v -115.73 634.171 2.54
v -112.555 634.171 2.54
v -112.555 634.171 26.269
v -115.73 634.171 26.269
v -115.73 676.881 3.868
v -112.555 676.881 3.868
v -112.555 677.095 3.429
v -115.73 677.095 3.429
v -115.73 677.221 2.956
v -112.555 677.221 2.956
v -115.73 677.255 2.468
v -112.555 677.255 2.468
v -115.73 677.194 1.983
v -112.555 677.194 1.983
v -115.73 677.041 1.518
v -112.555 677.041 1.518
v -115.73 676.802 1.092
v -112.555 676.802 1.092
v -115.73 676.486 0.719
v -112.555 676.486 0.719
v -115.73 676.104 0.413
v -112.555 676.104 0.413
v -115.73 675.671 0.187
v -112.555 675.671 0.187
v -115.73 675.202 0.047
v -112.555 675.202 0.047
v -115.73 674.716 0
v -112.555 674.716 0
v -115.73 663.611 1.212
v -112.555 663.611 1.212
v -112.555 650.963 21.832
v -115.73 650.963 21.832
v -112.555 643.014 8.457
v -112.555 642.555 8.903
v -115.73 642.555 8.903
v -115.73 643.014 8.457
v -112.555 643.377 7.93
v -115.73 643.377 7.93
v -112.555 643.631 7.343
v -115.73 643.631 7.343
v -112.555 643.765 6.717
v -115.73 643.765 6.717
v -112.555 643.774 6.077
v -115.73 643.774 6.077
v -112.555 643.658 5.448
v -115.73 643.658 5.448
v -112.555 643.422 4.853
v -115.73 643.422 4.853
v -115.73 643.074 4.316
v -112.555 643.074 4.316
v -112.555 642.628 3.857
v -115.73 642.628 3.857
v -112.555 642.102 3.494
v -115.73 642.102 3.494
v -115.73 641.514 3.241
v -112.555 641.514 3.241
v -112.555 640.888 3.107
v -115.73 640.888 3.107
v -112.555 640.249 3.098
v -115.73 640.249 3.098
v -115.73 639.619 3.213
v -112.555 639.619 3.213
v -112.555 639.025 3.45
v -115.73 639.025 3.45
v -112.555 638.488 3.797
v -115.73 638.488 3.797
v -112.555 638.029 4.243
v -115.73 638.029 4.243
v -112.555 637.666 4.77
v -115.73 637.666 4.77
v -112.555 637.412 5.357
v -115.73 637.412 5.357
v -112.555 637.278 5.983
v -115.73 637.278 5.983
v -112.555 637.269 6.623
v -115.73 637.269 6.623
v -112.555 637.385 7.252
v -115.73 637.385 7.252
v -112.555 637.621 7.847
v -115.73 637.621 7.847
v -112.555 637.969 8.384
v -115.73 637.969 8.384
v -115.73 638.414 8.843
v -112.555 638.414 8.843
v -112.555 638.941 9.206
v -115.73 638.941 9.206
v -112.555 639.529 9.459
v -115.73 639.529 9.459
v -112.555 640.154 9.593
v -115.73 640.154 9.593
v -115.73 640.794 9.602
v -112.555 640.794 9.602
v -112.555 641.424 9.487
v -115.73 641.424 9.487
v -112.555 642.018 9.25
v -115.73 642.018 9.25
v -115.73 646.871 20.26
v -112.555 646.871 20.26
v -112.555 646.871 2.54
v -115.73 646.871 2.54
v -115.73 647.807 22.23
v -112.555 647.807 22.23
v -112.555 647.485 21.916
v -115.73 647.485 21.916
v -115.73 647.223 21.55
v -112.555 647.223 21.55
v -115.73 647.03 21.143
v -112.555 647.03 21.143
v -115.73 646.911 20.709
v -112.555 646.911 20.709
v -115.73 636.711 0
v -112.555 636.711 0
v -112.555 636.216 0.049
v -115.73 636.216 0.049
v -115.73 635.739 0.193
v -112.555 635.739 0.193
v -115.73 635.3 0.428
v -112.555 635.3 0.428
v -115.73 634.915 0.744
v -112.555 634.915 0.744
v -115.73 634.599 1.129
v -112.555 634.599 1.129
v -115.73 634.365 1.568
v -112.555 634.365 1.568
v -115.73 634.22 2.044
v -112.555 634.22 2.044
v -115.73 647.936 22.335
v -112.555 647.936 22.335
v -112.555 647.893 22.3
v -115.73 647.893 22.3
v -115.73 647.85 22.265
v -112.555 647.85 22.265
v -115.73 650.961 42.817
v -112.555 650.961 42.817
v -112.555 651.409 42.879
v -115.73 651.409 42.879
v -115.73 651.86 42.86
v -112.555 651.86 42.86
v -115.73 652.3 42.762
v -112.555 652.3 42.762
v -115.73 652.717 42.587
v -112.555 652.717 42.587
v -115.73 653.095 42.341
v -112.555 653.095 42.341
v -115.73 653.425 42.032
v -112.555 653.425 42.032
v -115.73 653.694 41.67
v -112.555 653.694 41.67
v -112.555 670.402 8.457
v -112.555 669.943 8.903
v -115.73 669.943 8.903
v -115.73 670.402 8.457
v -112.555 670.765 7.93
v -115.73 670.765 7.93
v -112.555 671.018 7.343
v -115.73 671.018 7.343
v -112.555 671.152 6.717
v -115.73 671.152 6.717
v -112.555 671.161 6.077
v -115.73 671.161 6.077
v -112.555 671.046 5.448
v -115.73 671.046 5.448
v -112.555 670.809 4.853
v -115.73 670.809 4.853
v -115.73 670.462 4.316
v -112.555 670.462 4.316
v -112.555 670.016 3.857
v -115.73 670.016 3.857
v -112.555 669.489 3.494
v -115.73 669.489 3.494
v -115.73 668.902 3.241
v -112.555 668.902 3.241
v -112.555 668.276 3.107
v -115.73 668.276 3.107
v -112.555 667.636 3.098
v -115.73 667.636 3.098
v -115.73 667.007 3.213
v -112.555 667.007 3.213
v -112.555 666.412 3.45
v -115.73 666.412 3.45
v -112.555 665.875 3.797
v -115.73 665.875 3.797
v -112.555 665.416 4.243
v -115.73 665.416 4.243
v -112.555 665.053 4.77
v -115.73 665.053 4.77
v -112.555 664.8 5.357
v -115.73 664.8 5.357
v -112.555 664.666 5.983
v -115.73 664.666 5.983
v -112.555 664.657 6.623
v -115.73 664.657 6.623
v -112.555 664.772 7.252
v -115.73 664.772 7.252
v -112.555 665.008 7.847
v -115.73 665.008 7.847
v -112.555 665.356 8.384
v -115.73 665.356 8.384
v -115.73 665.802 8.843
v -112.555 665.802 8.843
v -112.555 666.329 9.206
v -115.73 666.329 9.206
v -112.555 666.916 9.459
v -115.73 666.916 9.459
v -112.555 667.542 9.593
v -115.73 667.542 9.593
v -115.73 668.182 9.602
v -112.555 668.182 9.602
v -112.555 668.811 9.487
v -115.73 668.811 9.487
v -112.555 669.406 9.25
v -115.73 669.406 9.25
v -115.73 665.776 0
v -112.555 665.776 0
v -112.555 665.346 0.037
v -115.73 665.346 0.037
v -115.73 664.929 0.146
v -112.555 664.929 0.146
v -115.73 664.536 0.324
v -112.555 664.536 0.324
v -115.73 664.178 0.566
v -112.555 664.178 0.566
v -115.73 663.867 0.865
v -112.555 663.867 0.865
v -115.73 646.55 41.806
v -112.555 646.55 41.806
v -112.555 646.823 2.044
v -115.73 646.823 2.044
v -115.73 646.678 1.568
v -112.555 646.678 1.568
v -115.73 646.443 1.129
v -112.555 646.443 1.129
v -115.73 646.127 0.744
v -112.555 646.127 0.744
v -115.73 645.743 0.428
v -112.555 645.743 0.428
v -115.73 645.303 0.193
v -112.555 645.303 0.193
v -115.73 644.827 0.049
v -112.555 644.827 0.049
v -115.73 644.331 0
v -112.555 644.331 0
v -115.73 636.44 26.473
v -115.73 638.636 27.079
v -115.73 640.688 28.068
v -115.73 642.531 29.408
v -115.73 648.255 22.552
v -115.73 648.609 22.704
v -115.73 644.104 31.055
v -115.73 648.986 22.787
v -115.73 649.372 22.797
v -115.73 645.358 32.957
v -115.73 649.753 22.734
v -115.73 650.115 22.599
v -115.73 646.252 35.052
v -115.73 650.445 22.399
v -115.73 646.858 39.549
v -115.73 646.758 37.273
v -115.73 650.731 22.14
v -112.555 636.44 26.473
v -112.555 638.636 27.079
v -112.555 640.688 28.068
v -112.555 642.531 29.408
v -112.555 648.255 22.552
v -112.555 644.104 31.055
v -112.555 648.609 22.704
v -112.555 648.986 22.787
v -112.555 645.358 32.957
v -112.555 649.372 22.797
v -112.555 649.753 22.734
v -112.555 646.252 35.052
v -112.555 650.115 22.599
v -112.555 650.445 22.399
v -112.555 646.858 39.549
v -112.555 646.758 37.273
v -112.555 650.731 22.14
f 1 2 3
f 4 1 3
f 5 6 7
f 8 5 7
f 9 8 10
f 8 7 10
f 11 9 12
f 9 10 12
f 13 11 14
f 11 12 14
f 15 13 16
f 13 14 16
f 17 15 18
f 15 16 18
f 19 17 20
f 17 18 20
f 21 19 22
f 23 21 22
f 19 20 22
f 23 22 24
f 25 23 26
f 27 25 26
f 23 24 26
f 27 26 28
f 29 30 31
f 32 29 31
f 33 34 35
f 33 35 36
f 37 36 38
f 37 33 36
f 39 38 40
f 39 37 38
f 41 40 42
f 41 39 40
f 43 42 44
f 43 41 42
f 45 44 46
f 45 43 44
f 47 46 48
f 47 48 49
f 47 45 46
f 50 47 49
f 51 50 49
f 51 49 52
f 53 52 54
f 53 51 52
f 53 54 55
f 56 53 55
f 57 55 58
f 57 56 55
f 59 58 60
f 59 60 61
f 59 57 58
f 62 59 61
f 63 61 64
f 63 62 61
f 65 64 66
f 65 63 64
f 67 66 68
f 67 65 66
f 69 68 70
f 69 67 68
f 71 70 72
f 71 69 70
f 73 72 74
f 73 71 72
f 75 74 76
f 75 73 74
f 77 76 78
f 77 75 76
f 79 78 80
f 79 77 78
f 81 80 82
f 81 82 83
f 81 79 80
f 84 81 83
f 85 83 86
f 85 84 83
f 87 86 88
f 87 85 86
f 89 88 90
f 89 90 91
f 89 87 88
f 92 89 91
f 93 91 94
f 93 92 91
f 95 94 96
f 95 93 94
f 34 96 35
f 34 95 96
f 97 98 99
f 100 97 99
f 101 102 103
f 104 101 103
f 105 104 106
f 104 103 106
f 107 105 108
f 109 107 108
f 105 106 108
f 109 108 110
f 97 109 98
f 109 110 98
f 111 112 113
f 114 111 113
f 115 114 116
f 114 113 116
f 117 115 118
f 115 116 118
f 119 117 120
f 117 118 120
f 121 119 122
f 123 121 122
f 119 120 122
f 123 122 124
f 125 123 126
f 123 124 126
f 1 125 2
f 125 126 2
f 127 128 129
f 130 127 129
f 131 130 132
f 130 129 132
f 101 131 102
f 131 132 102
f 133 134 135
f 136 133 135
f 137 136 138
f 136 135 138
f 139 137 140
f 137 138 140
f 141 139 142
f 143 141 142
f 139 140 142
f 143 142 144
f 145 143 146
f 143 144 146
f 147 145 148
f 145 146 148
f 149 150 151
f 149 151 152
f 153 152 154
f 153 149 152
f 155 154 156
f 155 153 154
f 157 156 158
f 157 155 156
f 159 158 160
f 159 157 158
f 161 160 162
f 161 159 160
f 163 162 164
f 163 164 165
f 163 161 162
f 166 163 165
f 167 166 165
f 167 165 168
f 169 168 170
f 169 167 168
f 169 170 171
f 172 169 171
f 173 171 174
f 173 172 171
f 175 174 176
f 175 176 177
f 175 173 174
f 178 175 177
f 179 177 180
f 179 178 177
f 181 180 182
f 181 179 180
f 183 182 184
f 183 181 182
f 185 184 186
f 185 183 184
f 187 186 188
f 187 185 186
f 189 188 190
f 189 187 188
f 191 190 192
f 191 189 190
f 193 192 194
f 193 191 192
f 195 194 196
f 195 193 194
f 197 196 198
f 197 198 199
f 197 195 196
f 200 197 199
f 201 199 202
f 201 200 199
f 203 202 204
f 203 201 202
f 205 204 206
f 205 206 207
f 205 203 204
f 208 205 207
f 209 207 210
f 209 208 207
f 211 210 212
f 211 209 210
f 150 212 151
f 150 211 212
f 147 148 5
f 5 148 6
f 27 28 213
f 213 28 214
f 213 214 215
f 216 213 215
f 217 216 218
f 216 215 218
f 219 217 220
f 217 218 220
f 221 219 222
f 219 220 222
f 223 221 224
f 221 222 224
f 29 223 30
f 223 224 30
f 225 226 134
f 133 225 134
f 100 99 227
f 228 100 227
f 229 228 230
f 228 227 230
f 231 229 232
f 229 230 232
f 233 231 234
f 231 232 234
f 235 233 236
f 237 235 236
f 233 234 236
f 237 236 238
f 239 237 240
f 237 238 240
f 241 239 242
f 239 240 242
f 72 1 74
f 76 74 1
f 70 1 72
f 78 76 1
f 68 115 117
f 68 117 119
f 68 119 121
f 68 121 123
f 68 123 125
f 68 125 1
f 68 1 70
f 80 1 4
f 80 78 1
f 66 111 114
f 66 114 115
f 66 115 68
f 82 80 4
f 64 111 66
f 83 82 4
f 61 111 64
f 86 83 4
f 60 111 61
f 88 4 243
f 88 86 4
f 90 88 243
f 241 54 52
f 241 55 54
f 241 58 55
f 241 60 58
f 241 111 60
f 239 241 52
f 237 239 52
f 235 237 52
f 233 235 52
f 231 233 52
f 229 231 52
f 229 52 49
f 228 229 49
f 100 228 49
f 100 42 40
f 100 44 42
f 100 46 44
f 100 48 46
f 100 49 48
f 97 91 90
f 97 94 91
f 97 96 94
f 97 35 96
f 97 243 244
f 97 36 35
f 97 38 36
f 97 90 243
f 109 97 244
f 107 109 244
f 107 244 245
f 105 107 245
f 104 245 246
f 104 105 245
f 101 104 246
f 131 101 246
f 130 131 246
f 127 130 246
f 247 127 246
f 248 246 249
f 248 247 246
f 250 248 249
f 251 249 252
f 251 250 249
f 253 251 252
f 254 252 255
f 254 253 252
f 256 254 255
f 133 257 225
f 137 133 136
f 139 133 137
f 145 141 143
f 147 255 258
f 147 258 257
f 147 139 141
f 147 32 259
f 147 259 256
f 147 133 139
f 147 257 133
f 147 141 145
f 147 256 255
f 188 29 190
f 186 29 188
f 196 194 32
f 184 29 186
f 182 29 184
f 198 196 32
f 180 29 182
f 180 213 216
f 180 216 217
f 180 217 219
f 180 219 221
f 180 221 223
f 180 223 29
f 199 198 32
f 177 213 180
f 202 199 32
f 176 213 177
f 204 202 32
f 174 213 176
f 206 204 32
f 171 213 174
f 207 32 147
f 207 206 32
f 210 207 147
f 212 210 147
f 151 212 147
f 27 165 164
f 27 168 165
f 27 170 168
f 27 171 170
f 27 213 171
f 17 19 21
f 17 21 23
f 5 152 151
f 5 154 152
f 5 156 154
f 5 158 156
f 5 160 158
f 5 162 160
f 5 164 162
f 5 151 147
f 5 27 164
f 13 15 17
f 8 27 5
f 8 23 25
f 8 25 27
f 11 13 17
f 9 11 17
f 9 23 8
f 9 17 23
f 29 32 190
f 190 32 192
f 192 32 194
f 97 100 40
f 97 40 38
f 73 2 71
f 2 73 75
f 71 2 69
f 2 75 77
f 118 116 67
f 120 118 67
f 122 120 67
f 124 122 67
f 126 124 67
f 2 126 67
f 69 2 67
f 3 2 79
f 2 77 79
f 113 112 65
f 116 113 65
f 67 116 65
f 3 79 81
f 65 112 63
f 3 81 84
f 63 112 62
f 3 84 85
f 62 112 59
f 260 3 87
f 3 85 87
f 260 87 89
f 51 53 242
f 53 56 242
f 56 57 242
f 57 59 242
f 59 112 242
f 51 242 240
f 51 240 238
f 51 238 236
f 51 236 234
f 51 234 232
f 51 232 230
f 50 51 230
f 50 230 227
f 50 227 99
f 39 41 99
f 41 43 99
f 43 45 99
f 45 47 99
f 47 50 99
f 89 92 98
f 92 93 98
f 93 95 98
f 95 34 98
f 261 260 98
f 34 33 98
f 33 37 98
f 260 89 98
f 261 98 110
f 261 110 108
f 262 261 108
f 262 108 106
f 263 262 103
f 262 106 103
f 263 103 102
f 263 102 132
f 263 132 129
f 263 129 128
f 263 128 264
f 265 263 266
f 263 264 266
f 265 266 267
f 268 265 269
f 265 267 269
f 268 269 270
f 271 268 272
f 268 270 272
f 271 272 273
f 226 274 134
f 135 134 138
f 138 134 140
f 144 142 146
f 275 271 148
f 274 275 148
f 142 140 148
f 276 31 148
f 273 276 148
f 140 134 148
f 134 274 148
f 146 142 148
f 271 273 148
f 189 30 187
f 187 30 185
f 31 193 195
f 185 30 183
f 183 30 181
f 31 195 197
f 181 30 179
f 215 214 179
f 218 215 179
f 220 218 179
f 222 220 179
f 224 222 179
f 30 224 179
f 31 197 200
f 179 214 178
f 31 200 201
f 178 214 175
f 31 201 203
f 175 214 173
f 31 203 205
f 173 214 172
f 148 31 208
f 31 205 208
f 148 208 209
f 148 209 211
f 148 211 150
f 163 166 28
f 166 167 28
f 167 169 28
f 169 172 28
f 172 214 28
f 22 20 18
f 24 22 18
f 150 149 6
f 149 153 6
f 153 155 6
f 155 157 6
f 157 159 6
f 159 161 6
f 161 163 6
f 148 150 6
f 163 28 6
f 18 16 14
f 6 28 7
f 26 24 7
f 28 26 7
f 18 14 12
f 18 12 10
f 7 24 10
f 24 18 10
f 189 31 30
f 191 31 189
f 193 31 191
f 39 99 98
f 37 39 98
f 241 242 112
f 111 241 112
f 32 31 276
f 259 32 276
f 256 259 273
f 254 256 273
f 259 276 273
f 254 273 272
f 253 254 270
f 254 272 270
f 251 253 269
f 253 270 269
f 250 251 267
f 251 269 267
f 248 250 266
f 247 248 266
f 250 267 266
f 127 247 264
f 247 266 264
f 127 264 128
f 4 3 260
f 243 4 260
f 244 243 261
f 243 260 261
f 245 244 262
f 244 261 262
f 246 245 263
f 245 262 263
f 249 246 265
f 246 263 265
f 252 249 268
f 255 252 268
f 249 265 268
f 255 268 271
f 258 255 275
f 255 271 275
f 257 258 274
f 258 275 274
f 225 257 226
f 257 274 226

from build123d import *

# Parameters (mm, degrees)
SKETCH2_R           = 3.2639
BOSS_EXTRUDE1_DEPTH = 3.175


with BuildPart() as part:
    # Sketch2 → Boss-Extrude1 (new body)
    with BuildSketch(Plane(origin=(-112.555, 0, -573.58969557), x_dir=(0, 0.6231241879767124, 0.7821229100073485), z_dir=(-1, 0, 0))):
        with BuildLine():
            ThreePointArc((845.36792337, 140.568969032), (844.830619791, 138.700663745), (845.771780124, 136.999641403))
            Line((845.771780124, 136.999641403), (864.330586832, 122.213677187))
            ThreePointArc((864.330586832, 122.213677187), (874.263547789, 127), (884.196508746, 122.213677187))
            Line((884.196508746, 122.213677187), (887.735832346, 125.033487368))
            ThreePointArc((887.735832346, 125.033487368), (888.597587529, 126.330104481), (888.540958266, 127.885942216))
            Line((888.540958266, 127.885942216), (873.423706379, 169.576043207))
            ThreePointArc((873.423706379, 169.576043207), (871.446613669, 171.216745754), (869.04925283, 170.292915988))
            Line((869.04925283, 170.292915988), (863.47898249, 163.301314423))
            ThreePointArc((863.47898249, 163.301314423), (862.959009478, 162.129347633), (863.077713324, 160.852716328))
            Line((863.077713324, 160.852716328), (871.323924882, 138.111453883))
            ThreePointArc((871.323924882, 138.111453883), (871.188959814, 136.430204891), (869.830832527, 135.430052896))
            ThreePointArc((869.830832527, 135.430052896), (869.749583246, 135.412845003), (869.668400761, 135.39532469))
            ThreePointArc((869.668400761, 135.39532469), (868.550892206, 135.403510223), (867.545059791, 135.890535404))
            Line((867.545059791, 135.890535404), (853.685457311, 146.932602361))
            ThreePointArc((853.685457311, 146.932602361), (851.817152024, 147.46990594), (850.116129682, 146.528745607))
            Line((850.116129682, 146.528745607), (845.36792337, 140.568969032))
        make_face()
        with Locations((852.708507005, 139.592018726)):
            Circle(SKETCH2_R, mode=Mode.SUBTRACT)
        with Locations((869.774365973, 161.012466745)):
            Circle(SKETCH2_R, mode=Mode.SUBTRACT)
    extrude(amount=BOSS_EXTRUDE1_DEPTH)


solid = part.part
